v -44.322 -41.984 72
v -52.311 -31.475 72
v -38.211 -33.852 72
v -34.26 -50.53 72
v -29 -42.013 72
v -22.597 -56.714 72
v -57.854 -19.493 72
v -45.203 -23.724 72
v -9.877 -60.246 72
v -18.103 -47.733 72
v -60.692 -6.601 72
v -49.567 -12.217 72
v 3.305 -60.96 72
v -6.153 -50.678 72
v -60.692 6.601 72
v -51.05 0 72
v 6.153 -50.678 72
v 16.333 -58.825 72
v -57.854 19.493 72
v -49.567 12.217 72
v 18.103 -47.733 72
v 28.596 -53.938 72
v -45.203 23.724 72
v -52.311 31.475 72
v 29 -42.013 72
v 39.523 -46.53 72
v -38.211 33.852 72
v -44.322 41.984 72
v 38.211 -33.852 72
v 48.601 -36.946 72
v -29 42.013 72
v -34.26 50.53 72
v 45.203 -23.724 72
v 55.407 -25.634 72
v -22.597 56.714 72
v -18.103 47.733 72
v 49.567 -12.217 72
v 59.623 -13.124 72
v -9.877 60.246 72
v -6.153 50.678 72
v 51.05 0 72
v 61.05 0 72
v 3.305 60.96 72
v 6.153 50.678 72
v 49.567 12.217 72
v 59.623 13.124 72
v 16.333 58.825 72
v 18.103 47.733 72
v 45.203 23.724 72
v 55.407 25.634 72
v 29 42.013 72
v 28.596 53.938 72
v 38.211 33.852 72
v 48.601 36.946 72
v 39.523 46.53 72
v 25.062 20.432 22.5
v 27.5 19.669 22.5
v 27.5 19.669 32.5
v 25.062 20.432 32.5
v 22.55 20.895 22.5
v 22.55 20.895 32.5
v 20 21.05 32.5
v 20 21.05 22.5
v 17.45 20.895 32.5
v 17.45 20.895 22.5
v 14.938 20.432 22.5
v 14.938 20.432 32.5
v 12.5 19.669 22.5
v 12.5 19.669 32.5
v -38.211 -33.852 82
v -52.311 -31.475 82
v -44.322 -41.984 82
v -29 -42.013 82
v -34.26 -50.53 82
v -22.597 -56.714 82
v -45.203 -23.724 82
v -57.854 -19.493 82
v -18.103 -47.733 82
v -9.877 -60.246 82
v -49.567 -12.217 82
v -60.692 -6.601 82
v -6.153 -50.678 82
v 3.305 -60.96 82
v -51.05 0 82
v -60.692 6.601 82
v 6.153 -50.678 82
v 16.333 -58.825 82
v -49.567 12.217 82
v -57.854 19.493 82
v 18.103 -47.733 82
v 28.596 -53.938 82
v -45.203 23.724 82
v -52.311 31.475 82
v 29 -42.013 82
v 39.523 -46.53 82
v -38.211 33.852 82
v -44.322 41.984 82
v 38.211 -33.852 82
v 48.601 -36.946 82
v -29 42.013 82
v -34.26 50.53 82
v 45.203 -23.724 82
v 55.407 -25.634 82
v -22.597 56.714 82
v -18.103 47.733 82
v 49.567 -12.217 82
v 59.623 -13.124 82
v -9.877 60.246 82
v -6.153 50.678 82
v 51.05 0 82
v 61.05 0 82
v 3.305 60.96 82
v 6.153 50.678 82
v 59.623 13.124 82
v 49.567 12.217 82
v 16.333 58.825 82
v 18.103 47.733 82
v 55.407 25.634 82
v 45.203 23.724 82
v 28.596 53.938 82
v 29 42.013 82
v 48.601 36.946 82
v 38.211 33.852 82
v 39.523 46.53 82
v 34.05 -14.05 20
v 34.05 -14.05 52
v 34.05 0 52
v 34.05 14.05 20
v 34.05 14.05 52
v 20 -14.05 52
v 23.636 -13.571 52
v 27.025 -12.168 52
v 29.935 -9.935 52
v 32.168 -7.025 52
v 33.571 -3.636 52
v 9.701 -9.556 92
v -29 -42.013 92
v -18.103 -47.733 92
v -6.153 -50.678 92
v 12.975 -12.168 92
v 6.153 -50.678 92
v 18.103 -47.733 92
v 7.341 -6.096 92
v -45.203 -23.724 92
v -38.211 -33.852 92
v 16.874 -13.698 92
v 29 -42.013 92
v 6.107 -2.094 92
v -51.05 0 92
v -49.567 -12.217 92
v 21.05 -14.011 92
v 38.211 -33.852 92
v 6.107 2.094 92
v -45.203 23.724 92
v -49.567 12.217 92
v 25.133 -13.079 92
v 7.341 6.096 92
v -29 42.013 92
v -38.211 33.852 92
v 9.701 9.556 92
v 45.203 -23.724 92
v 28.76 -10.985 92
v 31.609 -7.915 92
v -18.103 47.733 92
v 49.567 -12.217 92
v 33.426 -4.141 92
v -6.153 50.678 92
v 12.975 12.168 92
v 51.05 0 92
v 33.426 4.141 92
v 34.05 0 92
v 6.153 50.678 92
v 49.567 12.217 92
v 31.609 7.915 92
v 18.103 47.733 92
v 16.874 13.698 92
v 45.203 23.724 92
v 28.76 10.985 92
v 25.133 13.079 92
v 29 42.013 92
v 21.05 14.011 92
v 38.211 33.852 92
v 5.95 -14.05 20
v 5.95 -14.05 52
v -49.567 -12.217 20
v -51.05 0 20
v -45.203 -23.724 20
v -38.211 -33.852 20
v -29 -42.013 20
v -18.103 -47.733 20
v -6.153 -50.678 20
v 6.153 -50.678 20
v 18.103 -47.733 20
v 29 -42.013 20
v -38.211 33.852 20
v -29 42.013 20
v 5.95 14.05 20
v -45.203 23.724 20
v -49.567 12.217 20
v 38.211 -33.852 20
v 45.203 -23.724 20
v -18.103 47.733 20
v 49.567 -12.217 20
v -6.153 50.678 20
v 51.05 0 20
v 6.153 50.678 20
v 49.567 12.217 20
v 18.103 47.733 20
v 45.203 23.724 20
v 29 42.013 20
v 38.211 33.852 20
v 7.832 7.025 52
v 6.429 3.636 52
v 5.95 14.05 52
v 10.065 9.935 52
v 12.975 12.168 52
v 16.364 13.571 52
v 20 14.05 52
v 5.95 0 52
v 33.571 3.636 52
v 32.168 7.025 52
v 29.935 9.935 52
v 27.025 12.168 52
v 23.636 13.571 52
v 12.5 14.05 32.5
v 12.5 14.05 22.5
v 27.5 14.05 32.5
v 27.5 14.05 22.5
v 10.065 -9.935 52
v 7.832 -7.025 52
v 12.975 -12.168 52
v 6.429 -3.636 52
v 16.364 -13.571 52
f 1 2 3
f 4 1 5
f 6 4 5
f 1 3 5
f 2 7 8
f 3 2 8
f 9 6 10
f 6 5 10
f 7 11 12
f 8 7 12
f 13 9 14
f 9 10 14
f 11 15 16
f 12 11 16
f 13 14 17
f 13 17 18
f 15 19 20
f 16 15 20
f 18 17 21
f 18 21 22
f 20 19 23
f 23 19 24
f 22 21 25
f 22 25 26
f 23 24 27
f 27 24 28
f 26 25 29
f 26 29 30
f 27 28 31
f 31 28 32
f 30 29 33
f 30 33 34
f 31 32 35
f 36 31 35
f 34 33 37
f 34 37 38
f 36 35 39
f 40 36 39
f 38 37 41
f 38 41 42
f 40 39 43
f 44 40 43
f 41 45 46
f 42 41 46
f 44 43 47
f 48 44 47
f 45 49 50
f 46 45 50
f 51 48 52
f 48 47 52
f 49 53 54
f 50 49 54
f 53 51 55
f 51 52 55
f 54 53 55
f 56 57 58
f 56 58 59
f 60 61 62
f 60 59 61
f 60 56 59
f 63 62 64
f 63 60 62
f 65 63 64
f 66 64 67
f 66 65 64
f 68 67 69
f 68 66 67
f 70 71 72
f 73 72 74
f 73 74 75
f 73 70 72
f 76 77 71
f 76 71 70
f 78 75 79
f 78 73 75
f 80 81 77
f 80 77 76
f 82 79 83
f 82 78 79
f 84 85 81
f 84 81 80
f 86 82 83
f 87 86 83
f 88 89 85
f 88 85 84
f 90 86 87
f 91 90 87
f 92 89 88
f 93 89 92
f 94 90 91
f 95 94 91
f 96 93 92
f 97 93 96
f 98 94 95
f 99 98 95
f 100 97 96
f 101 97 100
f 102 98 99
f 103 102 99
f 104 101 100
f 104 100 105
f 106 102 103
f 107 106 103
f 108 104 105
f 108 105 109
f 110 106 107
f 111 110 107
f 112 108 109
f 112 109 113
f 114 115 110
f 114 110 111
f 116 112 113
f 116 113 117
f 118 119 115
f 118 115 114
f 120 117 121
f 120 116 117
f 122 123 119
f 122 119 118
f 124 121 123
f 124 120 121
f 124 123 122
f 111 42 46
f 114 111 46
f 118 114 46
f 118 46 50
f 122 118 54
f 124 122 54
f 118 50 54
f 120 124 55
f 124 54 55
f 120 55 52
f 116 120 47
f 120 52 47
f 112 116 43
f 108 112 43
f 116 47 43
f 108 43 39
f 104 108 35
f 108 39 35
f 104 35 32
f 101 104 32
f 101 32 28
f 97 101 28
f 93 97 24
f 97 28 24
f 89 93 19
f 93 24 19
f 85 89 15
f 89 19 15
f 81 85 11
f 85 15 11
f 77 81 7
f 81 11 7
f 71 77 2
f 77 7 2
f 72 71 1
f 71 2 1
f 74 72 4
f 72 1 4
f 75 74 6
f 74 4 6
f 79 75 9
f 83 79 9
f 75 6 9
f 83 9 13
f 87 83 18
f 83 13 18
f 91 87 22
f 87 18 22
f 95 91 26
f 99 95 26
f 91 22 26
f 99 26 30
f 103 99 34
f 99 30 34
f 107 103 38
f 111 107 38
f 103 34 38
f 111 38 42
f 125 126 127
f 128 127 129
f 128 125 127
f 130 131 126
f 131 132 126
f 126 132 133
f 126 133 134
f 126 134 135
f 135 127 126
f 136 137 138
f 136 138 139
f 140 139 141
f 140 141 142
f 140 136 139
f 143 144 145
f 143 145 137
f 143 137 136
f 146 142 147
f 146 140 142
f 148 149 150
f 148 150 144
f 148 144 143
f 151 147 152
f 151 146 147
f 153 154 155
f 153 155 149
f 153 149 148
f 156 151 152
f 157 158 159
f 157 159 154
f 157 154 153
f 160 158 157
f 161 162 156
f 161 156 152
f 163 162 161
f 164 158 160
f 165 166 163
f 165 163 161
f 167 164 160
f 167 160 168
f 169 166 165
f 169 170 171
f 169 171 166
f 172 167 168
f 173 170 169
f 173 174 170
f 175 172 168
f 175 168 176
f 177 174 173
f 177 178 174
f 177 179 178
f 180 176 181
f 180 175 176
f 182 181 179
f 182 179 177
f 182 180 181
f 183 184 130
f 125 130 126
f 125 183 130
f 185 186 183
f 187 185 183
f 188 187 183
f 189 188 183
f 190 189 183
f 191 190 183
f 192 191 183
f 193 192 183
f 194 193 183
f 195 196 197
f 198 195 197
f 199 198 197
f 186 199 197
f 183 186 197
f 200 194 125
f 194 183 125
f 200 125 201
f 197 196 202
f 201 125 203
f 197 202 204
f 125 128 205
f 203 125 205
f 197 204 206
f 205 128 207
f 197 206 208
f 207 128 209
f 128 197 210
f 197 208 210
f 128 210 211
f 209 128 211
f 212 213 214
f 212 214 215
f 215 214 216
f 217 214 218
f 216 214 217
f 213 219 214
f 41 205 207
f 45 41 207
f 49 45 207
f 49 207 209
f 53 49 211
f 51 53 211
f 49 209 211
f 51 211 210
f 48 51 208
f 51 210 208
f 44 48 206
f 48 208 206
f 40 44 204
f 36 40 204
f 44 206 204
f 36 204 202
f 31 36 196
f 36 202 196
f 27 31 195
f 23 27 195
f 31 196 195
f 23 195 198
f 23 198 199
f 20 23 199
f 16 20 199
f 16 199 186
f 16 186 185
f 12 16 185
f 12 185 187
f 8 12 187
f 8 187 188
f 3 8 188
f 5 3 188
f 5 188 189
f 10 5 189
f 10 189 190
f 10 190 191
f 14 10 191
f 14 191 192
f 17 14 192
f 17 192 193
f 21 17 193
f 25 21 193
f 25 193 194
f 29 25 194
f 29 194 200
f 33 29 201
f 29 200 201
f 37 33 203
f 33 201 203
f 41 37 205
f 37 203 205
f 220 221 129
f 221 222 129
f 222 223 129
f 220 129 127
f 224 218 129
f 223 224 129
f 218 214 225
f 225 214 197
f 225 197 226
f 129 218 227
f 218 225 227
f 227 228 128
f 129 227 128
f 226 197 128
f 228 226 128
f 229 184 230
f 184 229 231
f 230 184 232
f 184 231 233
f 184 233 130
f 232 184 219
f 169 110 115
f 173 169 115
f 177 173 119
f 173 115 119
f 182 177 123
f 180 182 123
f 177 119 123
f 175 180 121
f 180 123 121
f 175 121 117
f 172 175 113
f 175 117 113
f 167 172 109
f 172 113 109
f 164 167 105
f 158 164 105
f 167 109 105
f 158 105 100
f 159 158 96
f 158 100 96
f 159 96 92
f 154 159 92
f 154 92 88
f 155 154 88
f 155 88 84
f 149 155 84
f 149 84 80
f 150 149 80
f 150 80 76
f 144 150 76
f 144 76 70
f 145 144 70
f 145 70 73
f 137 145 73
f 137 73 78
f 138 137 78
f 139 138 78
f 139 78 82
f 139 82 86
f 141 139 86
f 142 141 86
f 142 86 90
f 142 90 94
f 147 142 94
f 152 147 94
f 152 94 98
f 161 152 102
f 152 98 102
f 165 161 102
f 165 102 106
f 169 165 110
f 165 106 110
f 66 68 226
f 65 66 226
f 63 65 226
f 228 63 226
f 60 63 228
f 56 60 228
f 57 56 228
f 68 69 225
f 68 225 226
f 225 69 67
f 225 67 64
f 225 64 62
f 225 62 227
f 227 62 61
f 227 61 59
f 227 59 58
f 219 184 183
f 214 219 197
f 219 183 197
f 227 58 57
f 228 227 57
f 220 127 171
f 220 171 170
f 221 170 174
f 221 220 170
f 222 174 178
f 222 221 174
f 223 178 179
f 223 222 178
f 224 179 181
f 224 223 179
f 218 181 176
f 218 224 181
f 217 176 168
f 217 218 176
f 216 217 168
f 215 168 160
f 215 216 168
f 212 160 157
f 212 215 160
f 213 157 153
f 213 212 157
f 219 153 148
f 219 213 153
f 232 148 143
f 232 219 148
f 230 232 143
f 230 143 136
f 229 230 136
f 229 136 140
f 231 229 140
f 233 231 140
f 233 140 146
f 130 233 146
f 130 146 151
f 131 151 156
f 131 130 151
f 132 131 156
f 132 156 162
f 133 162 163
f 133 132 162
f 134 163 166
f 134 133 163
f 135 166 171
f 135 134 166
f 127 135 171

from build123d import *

# Parameters (mm, degrees)
SKETCH5_W           = 42.1
SKETCH5_H           = 42.1
SKETCH5_W_2         = 28.1
SKETCH5_H_2         = 28.1
BOSS_EXTRUDE3_DEPTH = 32
CUT_EXTRUDE2_REACH  = 80.495
SKETCH6_W           = 15
SKETCH6_H           = 10
SKETCH7_W           = 42.1
SKETCH7_H           = 42.1
SKETCH7_R           = 14.05
BOSS_EXTRUDE4_DEPTH = 40
CUT_EXTRUDE3_START  = -72
CUT_EXTRUDE3_DEPTH  = 72
CIRPATTERN1_COUNT   = 4
BOSS_EXTRUDE6_START = -72
SKETCH24_R          = 51.05
SKETCH24_R_2        = 21.05
BOSS_EXTRUDE6_DEPTH = 72
BOSS_EXTRUDE7_START = -20
SKETCH25_R          = 61.05
SKETCH25_R_2        = 51.05
BOSS_EXTRUDE7_DEPTH = 10


with BuildPart() as part:
    # Sketch5 → Boss-Extrude3 (new body)
    with BuildSketch(Plane.XY.offset(20)):
        with Locations((20, 0)):
            Rectangle(SKETCH5_W, SKETCH5_H)
        with Locations((20, 0)):
            Rectangle(SKETCH5_W_2, SKETCH5_H_2, mode=Mode.SUBTRACT)
    extrude(amount=BOSS_EXTRUDE3_DEPTH)

    # Sketch6 → Cut-Extrude2 (cut, up to next)
    with BuildSketch(Plane(origin=(0, 21.05, 0), x_dir=(1, 0, 0), z_dir=(0, 1, 0)), mode=Mode.PRIVATE) as cut_extrude2_sk1:
        with Locations((20, -27.5)):
            Rectangle(SKETCH6_W, SKETCH6_H)
    cut_extrude2_tool1 = extrude(cut_extrude2_sk1.sketch, amount=-CUT_EXTRUDE2_REACH, mode=Mode.PRIVATE) & part.part
    add(cut_extrude2_tool1.solids().sort_by_distance((20, 21.05, 27.5))[0], mode=Mode.SUBTRACT)

    # Sketch7 → Boss-Extrude4 (add)
    with BuildSketch(Plane.XY.offset(52)):
        with Locations((20, 0)):
            Rectangle(SKETCH7_W, SKETCH7_H)
        with Locations((20, 0)):
            Circle(SKETCH7_R, mode=Mode.SUBTRACT)
    extrude(amount=BOSS_EXTRUDE4_DEPTH)

    # Sketch11 → Cut-Extrude3 (cut)
    with BuildSketch(Plane.XY.offset(92).offset(CUT_EXTRUDE3_START)):
        with BuildLine():
            Line((20, 21.05), (-1.05, 21.05))
            Line((-1.05, 21.05), (-1.05, 0))
            ThreePointArc((-1.05, 0), (5.115402256, 14.884597744), (20, 21.05))
        make_face()
    cut_extrude3 = extrude(amount=CUT_EXTRUDE3_DEPTH, mode=Mode.SUBTRACT)

    # CirPattern1: Cut-Extrude3 ×4 about axis
    cirpattern1_axis = Axis((20, 0, 92), (0, 0, 1))
    for i in range(1, CIRPATTERN1_COUNT):
        add(cut_extrude3.rotate(cirpattern1_axis, i * 360 / CIRPATTERN1_COUNT), mode=Mode.SUBTRACT)

    # Sketch24 → Boss-Extrude6 (add)
    with BuildSketch(Plane.XY.offset(92).offset(BOSS_EXTRUDE6_START)):
        Circle(SKETCH24_R)
        with Locations((20, 0)):
            Circle(SKETCH24_R_2, mode=Mode.SUBTRACT)
    extrude(amount=BOSS_EXTRUDE6_DEPTH)

    # Sketch25 → Boss-Extrude7 (add)
    with BuildSketch(Plane.XY.offset(92).offset(BOSS_EXTRUDE7_START)):
        Circle(SKETCH25_R)
        Circle(SKETCH25_R_2, mode=Mode.SUBTRACT)
    extrude(amount=BOSS_EXTRUDE7_DEPTH)


solid = part.part
